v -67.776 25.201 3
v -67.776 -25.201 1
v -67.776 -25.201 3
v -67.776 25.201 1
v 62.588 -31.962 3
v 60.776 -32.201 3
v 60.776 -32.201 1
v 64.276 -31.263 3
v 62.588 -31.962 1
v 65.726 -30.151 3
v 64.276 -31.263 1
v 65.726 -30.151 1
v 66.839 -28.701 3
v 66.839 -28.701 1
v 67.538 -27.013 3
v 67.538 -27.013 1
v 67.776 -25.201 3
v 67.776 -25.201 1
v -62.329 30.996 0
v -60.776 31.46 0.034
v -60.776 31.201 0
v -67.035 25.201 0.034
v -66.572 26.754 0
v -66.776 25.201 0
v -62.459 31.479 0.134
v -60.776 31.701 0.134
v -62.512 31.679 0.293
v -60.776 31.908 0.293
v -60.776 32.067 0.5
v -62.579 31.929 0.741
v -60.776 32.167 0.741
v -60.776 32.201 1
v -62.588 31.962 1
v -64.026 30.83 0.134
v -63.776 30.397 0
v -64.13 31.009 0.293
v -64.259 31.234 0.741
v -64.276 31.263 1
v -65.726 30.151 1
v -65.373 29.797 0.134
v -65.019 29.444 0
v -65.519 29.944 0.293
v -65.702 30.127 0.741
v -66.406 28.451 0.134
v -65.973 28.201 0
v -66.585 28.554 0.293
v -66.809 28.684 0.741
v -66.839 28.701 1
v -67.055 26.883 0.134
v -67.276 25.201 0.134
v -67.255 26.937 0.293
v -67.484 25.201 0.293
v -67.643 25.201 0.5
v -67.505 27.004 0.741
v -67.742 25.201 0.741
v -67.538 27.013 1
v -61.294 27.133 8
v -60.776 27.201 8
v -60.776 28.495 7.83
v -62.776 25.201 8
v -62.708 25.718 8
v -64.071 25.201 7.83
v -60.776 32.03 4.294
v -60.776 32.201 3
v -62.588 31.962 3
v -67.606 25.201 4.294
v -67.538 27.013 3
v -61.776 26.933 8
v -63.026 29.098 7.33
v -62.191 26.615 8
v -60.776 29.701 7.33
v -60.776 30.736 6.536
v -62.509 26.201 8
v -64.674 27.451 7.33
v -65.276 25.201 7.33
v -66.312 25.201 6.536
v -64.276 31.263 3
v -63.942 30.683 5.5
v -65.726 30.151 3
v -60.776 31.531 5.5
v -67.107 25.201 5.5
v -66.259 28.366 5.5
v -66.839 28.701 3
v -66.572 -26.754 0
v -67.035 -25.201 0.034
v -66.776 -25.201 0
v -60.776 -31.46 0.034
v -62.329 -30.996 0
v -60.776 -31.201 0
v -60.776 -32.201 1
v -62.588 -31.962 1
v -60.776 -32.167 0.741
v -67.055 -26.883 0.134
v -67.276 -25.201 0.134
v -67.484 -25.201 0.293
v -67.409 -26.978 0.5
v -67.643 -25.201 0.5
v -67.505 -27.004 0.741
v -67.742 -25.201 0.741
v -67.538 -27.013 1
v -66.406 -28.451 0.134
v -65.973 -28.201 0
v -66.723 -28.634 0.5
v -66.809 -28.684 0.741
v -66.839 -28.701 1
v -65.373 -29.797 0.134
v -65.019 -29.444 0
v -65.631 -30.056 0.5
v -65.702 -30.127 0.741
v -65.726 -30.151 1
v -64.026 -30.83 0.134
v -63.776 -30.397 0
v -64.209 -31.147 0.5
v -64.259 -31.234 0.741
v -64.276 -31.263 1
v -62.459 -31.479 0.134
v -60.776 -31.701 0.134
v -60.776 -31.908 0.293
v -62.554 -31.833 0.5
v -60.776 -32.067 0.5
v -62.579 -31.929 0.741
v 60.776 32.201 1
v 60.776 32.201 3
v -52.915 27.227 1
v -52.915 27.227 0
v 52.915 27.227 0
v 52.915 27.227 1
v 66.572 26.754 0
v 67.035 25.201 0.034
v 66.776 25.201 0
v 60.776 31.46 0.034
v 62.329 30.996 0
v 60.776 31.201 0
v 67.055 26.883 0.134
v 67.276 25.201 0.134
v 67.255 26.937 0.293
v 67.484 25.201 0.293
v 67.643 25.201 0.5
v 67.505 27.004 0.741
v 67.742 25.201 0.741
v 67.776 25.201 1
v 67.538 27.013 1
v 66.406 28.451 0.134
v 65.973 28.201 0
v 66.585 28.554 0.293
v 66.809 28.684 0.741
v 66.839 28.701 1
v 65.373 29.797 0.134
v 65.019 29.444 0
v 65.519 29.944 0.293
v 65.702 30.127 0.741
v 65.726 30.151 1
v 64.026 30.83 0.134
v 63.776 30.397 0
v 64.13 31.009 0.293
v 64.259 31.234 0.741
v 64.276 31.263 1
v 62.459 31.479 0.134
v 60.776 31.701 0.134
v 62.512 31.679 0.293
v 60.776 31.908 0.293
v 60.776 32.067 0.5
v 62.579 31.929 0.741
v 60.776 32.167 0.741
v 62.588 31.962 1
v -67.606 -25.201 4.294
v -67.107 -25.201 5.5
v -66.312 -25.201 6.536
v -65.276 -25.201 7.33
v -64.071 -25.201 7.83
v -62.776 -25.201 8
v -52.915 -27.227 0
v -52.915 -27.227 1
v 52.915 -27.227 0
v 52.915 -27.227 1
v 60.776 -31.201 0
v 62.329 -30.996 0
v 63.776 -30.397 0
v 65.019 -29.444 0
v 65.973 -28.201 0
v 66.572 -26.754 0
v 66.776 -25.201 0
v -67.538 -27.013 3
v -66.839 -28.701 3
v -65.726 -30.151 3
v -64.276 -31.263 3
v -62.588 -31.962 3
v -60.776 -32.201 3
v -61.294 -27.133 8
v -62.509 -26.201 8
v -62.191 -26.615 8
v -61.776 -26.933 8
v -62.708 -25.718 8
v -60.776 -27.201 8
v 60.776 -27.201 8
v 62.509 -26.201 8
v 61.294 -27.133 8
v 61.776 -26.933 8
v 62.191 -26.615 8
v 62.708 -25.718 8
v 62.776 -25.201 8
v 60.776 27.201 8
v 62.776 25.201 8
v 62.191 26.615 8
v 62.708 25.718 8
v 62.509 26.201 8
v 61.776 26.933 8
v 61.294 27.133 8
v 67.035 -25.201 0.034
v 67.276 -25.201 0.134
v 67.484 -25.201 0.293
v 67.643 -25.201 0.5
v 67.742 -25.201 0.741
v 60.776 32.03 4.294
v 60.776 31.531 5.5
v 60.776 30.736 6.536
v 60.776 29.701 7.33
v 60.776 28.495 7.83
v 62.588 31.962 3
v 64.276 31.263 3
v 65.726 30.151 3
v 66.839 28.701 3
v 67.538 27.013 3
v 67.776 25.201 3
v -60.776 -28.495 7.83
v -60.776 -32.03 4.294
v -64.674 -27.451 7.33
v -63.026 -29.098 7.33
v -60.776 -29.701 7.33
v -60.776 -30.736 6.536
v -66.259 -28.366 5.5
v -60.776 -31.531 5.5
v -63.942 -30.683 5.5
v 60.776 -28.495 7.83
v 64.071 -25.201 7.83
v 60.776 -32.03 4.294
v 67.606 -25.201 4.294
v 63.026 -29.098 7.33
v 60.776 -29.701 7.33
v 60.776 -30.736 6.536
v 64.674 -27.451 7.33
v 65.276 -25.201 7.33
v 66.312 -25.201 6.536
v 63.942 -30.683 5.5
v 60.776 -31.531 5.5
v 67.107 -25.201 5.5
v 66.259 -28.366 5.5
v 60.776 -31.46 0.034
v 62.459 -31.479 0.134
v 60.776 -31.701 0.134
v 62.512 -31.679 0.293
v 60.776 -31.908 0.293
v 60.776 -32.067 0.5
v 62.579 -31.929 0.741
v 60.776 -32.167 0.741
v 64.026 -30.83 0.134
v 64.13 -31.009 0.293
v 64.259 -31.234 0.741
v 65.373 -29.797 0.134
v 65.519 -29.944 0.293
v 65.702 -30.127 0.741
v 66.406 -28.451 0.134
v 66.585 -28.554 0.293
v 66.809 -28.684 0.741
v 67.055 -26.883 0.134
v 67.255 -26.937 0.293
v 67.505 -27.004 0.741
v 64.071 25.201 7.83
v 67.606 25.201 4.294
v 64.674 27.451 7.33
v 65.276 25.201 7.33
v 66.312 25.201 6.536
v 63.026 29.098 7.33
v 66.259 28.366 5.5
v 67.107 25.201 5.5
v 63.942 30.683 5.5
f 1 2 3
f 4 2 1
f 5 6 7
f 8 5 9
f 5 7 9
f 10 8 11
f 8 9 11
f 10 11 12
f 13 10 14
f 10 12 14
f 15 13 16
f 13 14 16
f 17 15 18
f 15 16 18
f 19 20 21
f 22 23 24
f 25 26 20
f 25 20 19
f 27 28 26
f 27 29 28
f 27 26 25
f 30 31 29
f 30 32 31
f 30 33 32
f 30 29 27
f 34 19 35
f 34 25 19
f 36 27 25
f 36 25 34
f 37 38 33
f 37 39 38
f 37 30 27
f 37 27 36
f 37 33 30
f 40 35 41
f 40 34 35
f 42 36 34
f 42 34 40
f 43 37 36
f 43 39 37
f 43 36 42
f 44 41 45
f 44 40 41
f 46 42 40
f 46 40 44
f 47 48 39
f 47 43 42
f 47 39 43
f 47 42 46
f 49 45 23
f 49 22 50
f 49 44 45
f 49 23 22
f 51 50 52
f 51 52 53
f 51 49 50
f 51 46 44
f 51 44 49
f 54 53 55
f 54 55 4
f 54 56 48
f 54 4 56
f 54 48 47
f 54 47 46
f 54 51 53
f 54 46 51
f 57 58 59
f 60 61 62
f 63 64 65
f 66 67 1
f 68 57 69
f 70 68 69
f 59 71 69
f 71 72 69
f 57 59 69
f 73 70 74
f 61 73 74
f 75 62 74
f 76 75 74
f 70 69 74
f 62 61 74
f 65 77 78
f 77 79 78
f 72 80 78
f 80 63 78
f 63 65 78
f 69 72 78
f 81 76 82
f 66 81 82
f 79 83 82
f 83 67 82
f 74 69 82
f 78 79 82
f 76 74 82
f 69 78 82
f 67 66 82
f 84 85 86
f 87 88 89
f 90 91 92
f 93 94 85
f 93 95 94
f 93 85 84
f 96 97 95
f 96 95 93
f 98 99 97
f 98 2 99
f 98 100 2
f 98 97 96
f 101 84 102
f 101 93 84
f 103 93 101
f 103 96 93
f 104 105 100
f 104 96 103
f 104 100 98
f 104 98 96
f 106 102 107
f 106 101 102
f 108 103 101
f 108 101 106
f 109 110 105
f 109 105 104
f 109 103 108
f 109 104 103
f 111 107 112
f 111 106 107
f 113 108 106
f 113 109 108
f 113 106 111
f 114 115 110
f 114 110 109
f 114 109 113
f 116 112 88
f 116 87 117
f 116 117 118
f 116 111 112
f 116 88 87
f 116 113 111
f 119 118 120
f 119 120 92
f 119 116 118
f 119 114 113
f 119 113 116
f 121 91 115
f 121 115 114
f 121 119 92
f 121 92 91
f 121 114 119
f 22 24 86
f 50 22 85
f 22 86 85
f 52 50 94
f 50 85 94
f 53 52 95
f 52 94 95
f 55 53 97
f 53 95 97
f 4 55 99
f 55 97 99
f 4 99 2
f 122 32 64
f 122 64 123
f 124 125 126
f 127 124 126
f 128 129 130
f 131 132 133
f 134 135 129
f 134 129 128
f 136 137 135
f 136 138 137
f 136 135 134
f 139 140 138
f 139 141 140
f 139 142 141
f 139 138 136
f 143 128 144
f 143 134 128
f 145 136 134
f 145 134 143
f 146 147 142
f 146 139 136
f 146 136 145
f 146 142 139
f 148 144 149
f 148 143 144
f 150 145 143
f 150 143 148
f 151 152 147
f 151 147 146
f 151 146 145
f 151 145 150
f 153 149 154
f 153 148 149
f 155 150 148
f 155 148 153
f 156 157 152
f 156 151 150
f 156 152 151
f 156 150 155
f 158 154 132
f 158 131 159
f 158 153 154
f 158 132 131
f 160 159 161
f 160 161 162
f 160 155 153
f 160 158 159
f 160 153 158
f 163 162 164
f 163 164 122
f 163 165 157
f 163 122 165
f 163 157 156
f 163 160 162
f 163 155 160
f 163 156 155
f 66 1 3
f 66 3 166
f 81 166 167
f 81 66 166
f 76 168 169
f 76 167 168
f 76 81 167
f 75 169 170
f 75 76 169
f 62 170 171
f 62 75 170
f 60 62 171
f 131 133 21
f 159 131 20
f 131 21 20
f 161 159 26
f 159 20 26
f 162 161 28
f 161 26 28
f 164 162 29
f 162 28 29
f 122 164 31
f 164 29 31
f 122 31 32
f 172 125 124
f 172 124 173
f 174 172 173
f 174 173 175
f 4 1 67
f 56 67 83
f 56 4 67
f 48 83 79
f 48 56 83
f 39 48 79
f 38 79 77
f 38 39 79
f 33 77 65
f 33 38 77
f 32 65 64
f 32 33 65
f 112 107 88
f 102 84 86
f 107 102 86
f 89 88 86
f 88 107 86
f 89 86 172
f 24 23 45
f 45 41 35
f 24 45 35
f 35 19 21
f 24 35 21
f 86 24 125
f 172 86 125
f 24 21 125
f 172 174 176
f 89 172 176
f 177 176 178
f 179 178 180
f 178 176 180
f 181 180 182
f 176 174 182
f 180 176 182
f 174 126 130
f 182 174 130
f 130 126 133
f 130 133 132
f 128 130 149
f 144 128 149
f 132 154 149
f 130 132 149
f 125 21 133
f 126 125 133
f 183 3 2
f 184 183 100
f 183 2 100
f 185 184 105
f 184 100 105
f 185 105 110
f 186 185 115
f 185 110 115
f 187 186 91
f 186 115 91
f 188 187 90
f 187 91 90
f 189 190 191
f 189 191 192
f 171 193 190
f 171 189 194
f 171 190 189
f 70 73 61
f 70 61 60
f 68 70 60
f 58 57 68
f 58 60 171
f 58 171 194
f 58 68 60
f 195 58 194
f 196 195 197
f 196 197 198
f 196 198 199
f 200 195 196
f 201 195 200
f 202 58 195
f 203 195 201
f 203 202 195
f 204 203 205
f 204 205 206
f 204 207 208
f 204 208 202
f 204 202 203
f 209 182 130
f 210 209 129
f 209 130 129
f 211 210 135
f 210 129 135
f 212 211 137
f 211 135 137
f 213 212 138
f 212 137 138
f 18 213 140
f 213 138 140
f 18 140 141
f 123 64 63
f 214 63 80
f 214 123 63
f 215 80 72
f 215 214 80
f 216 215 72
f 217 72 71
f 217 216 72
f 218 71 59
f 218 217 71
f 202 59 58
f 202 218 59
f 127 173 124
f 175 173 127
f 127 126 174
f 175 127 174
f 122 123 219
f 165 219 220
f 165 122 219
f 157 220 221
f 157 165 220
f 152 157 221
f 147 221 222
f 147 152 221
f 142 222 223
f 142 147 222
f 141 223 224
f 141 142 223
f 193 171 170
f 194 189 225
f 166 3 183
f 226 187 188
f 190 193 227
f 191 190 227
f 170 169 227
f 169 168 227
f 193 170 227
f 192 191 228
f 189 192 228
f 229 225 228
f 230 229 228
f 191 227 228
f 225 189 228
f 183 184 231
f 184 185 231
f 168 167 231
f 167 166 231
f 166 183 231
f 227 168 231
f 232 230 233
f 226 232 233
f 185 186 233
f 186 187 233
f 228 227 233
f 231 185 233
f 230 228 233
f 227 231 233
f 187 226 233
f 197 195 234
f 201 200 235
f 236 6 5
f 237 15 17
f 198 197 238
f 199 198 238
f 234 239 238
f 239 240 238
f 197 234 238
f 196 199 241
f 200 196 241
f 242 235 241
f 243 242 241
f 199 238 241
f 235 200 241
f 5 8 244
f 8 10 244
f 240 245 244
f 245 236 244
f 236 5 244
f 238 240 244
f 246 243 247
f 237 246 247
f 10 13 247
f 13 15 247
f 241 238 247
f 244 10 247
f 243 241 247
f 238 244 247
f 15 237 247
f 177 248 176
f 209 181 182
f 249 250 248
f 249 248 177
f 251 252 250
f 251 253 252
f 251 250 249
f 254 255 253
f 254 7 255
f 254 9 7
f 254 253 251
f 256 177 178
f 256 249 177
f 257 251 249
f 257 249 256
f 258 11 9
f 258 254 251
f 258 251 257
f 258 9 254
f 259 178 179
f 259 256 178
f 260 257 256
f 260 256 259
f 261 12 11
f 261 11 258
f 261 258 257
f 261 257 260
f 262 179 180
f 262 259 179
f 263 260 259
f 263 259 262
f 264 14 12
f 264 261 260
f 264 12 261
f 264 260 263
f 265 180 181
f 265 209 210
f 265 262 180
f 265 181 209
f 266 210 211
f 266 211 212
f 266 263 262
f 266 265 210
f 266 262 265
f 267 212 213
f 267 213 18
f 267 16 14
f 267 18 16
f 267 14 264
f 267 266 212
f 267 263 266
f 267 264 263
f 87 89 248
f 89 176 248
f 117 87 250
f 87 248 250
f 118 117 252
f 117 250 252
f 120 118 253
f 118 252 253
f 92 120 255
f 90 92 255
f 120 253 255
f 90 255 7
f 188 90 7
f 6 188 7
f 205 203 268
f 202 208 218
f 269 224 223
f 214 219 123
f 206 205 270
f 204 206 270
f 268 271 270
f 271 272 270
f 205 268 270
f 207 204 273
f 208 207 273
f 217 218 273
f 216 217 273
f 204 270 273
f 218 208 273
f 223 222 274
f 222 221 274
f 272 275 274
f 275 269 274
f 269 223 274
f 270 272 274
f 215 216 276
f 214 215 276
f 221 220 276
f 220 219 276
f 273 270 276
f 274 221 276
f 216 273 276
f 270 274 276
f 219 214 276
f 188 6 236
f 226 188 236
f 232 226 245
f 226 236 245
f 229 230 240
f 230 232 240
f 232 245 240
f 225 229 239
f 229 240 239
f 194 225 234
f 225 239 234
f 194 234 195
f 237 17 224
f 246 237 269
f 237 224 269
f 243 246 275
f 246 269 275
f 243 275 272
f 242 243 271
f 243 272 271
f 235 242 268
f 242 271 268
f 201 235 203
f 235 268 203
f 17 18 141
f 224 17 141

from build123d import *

# Parameters (mm, degrees)
F0_W         = 135.5529725552
F0_H         = 64.4017234445
F1_DEPTH     = 8
F2_R         = 5
F3_T1_DEPTH  = 25.5
F3_T4_ANGLE  = 90
F3_T6_ANGLE  = 90
F3_T8_ANGLE  = 90
F3_T10_ANGLE = 90
F4_R         = 1
F5_W         = 105.8298870921
F5_H         = 54.4540472329
F6_DEPTH     = 1


# Not quite as in the source:
# - a fillet or chamfer that OpenCascade refuses, or shapes differently, is made with other operations: its cross-section is extruded or revolved along the edge and cut away or added


with BuildPart() as f1:
    # F0 (on Top) → F1 (new body)
    with BuildSketch(Plane.XY):
        Rectangle(F0_W, F0_H)
    extrude(amount=F1_DEPTH)

    # F2
    f2_edges = [f1.edges().sort_by_distance(p)[0] for p in [
        (0, 32.200862, 8),
        (-67.776486, 0, 8),
        (0, -32.200862, 8),
        (67.776486, 0, 8),
    ]]
    fillet(f2_edges, radius=F2_R)

    # F3: fillet of radius 7 on 4 edges, made by hand

    # F3_s2 → F3_t1 (cut)
    with BuildSketch(Plane.XY.offset(-17.5)):
        with BuildLine():
            ThreePointArc((-67.7764862776, -25.2008617222), (-65.7262337459, -30.1506091905), (-60.7764862776, -32.2008617222))
            Line((-60.7764862776, -32.2008617222), (-67.7764862776, -32.2008617222))
            Line((-67.7764862776, -32.2008617222), (-67.7764862776, -25.2008617222))
        make_face()
        with BuildLine():
            ThreePointArc((60.7764862776, -32.2008617222), (65.7262337459, -30.1506091905), (67.7764862776, -25.2008617222))
            Line((67.7764862776, -25.2008617222), (67.7764862776, -32.2008617222))
            Line((67.7764862776, -32.2008617222), (60.7764862776, -32.2008617222))
        make_face()
        with BuildLine():
            ThreePointArc((60.7764862776, 32.2008617222), (65.7262337459, 30.1506091905), (67.7764862776, 25.2008617222))
            Line((67.7764862776, 25.2008617222), (67.7764862776, 32.2008617222))
            Line((67.7764862776, 32.2008617222), (60.7764862776, 32.2008617222))
        make_face()
        with BuildLine():
            ThreePointArc((-67.7764862776, 25.2008617222), (-65.7262337459, 30.1506091905), (-60.7764862776, 32.2008617222))
            Line((-60.7764862776, 32.2008617222), (-67.7764862776, 32.2008617222))
            Line((-67.7764862776, 32.2008617222), (-67.7764862776, 25.2008617222))
        make_face()
    extrude(amount=F3_T1_DEPTH, mode=Mode.SUBTRACT)

    # F3_s3 → F3_t4 (revolve, cut)
    with BuildSketch(Plane.YZ.offset(-60.7764862776)):
        with BuildLine():
            ThreePointArc((27.2008617222, 8), (30.7363956282, 6.5355339059), (32.2008617222, 3))
            Line((32.2008617222, 3), (32.2008617222, 8))
            Line((32.2008617222, 8), (27.2008617222, 8))
        make_face()
    revolve(axis=Axis((-60.7764862776, 25.2008617222, 8), (0, 0, 1)), revolution_arc=F3_T4_ANGLE, mode=Mode.SUBTRACT)

    # F3_s5 → F3_t6 (revolve, cut)
    with BuildSketch(Plane.XZ.offset(-25.2008617222)):
        with BuildLine():
            ThreePointArc((62.7764862776, 8), (66.3120201835, 6.5355339059), (67.7764862776, 3))
            Line((67.7764862776, 3), (67.7764862776, 8))
            Line((67.7764862776, 8), (62.7764862776, 8))
        make_face()
    revolve(axis=Axis((60.7764862776, 25.2008617222, 8), (0, 0, 1)), revolution_arc=F3_T6_ANGLE, mode=Mode.SUBTRACT)

    # F3_s7 → F3_t8 (revolve, cut)
    with BuildSketch(Plane.YZ.offset(60.7764862776)):
        with BuildLine():
            ThreePointArc((-27.2008617222, 8), (-30.7363956282, 6.5355339059), (-32.2008617222, 3))
            Line((-32.2008617222, 3), (-32.2008617222, 8))
            Line((-32.2008617222, 8), (-27.2008617222, 8))
        make_face()
    revolve(axis=Axis((60.7764862776, -25.2008617222, 8), (0, 0, 1)), revolution_arc=F3_T8_ANGLE, mode=Mode.SUBTRACT)

    # F3_s9 → F3_t10 (revolve, cut)
    with BuildSketch(Plane.XZ.offset(25.2008617222)):
        with BuildLine():
            ThreePointArc((-62.7764862776, 8), (-66.3120201835, 6.5355339059), (-67.7764862776, 3))
            Line((-67.7764862776, 3), (-67.7764862776, 8))
            Line((-67.7764862776, 8), (-62.7764862776, 8))
        make_face()
    revolve(axis=Axis((-60.7764862776, -25.2008617222, 8), (0, 0, 1)), revolution_arc=F3_T10_ANGLE, mode=Mode.SUBTRACT)

    # F4
    f4_edges = [f1.edges().sort_by_distance(p)[0] for p in [
        (0, -32.200862, 0),
        (-67.776486, 0, 0),
    ]]
    fillet(f4_edges, radius=F4_R)

    # F5 (on face) → F6 (cut)
    with BuildSketch(Plane(origin=(0, 0, 0), x_dir=(1, 0, 0), z_dir=(0, 0, -1))):
        Rectangle(F5_W, F5_H)
    extrude(amount=-F6_DEPTH, mode=Mode.SUBTRACT)


solid = f1.part
